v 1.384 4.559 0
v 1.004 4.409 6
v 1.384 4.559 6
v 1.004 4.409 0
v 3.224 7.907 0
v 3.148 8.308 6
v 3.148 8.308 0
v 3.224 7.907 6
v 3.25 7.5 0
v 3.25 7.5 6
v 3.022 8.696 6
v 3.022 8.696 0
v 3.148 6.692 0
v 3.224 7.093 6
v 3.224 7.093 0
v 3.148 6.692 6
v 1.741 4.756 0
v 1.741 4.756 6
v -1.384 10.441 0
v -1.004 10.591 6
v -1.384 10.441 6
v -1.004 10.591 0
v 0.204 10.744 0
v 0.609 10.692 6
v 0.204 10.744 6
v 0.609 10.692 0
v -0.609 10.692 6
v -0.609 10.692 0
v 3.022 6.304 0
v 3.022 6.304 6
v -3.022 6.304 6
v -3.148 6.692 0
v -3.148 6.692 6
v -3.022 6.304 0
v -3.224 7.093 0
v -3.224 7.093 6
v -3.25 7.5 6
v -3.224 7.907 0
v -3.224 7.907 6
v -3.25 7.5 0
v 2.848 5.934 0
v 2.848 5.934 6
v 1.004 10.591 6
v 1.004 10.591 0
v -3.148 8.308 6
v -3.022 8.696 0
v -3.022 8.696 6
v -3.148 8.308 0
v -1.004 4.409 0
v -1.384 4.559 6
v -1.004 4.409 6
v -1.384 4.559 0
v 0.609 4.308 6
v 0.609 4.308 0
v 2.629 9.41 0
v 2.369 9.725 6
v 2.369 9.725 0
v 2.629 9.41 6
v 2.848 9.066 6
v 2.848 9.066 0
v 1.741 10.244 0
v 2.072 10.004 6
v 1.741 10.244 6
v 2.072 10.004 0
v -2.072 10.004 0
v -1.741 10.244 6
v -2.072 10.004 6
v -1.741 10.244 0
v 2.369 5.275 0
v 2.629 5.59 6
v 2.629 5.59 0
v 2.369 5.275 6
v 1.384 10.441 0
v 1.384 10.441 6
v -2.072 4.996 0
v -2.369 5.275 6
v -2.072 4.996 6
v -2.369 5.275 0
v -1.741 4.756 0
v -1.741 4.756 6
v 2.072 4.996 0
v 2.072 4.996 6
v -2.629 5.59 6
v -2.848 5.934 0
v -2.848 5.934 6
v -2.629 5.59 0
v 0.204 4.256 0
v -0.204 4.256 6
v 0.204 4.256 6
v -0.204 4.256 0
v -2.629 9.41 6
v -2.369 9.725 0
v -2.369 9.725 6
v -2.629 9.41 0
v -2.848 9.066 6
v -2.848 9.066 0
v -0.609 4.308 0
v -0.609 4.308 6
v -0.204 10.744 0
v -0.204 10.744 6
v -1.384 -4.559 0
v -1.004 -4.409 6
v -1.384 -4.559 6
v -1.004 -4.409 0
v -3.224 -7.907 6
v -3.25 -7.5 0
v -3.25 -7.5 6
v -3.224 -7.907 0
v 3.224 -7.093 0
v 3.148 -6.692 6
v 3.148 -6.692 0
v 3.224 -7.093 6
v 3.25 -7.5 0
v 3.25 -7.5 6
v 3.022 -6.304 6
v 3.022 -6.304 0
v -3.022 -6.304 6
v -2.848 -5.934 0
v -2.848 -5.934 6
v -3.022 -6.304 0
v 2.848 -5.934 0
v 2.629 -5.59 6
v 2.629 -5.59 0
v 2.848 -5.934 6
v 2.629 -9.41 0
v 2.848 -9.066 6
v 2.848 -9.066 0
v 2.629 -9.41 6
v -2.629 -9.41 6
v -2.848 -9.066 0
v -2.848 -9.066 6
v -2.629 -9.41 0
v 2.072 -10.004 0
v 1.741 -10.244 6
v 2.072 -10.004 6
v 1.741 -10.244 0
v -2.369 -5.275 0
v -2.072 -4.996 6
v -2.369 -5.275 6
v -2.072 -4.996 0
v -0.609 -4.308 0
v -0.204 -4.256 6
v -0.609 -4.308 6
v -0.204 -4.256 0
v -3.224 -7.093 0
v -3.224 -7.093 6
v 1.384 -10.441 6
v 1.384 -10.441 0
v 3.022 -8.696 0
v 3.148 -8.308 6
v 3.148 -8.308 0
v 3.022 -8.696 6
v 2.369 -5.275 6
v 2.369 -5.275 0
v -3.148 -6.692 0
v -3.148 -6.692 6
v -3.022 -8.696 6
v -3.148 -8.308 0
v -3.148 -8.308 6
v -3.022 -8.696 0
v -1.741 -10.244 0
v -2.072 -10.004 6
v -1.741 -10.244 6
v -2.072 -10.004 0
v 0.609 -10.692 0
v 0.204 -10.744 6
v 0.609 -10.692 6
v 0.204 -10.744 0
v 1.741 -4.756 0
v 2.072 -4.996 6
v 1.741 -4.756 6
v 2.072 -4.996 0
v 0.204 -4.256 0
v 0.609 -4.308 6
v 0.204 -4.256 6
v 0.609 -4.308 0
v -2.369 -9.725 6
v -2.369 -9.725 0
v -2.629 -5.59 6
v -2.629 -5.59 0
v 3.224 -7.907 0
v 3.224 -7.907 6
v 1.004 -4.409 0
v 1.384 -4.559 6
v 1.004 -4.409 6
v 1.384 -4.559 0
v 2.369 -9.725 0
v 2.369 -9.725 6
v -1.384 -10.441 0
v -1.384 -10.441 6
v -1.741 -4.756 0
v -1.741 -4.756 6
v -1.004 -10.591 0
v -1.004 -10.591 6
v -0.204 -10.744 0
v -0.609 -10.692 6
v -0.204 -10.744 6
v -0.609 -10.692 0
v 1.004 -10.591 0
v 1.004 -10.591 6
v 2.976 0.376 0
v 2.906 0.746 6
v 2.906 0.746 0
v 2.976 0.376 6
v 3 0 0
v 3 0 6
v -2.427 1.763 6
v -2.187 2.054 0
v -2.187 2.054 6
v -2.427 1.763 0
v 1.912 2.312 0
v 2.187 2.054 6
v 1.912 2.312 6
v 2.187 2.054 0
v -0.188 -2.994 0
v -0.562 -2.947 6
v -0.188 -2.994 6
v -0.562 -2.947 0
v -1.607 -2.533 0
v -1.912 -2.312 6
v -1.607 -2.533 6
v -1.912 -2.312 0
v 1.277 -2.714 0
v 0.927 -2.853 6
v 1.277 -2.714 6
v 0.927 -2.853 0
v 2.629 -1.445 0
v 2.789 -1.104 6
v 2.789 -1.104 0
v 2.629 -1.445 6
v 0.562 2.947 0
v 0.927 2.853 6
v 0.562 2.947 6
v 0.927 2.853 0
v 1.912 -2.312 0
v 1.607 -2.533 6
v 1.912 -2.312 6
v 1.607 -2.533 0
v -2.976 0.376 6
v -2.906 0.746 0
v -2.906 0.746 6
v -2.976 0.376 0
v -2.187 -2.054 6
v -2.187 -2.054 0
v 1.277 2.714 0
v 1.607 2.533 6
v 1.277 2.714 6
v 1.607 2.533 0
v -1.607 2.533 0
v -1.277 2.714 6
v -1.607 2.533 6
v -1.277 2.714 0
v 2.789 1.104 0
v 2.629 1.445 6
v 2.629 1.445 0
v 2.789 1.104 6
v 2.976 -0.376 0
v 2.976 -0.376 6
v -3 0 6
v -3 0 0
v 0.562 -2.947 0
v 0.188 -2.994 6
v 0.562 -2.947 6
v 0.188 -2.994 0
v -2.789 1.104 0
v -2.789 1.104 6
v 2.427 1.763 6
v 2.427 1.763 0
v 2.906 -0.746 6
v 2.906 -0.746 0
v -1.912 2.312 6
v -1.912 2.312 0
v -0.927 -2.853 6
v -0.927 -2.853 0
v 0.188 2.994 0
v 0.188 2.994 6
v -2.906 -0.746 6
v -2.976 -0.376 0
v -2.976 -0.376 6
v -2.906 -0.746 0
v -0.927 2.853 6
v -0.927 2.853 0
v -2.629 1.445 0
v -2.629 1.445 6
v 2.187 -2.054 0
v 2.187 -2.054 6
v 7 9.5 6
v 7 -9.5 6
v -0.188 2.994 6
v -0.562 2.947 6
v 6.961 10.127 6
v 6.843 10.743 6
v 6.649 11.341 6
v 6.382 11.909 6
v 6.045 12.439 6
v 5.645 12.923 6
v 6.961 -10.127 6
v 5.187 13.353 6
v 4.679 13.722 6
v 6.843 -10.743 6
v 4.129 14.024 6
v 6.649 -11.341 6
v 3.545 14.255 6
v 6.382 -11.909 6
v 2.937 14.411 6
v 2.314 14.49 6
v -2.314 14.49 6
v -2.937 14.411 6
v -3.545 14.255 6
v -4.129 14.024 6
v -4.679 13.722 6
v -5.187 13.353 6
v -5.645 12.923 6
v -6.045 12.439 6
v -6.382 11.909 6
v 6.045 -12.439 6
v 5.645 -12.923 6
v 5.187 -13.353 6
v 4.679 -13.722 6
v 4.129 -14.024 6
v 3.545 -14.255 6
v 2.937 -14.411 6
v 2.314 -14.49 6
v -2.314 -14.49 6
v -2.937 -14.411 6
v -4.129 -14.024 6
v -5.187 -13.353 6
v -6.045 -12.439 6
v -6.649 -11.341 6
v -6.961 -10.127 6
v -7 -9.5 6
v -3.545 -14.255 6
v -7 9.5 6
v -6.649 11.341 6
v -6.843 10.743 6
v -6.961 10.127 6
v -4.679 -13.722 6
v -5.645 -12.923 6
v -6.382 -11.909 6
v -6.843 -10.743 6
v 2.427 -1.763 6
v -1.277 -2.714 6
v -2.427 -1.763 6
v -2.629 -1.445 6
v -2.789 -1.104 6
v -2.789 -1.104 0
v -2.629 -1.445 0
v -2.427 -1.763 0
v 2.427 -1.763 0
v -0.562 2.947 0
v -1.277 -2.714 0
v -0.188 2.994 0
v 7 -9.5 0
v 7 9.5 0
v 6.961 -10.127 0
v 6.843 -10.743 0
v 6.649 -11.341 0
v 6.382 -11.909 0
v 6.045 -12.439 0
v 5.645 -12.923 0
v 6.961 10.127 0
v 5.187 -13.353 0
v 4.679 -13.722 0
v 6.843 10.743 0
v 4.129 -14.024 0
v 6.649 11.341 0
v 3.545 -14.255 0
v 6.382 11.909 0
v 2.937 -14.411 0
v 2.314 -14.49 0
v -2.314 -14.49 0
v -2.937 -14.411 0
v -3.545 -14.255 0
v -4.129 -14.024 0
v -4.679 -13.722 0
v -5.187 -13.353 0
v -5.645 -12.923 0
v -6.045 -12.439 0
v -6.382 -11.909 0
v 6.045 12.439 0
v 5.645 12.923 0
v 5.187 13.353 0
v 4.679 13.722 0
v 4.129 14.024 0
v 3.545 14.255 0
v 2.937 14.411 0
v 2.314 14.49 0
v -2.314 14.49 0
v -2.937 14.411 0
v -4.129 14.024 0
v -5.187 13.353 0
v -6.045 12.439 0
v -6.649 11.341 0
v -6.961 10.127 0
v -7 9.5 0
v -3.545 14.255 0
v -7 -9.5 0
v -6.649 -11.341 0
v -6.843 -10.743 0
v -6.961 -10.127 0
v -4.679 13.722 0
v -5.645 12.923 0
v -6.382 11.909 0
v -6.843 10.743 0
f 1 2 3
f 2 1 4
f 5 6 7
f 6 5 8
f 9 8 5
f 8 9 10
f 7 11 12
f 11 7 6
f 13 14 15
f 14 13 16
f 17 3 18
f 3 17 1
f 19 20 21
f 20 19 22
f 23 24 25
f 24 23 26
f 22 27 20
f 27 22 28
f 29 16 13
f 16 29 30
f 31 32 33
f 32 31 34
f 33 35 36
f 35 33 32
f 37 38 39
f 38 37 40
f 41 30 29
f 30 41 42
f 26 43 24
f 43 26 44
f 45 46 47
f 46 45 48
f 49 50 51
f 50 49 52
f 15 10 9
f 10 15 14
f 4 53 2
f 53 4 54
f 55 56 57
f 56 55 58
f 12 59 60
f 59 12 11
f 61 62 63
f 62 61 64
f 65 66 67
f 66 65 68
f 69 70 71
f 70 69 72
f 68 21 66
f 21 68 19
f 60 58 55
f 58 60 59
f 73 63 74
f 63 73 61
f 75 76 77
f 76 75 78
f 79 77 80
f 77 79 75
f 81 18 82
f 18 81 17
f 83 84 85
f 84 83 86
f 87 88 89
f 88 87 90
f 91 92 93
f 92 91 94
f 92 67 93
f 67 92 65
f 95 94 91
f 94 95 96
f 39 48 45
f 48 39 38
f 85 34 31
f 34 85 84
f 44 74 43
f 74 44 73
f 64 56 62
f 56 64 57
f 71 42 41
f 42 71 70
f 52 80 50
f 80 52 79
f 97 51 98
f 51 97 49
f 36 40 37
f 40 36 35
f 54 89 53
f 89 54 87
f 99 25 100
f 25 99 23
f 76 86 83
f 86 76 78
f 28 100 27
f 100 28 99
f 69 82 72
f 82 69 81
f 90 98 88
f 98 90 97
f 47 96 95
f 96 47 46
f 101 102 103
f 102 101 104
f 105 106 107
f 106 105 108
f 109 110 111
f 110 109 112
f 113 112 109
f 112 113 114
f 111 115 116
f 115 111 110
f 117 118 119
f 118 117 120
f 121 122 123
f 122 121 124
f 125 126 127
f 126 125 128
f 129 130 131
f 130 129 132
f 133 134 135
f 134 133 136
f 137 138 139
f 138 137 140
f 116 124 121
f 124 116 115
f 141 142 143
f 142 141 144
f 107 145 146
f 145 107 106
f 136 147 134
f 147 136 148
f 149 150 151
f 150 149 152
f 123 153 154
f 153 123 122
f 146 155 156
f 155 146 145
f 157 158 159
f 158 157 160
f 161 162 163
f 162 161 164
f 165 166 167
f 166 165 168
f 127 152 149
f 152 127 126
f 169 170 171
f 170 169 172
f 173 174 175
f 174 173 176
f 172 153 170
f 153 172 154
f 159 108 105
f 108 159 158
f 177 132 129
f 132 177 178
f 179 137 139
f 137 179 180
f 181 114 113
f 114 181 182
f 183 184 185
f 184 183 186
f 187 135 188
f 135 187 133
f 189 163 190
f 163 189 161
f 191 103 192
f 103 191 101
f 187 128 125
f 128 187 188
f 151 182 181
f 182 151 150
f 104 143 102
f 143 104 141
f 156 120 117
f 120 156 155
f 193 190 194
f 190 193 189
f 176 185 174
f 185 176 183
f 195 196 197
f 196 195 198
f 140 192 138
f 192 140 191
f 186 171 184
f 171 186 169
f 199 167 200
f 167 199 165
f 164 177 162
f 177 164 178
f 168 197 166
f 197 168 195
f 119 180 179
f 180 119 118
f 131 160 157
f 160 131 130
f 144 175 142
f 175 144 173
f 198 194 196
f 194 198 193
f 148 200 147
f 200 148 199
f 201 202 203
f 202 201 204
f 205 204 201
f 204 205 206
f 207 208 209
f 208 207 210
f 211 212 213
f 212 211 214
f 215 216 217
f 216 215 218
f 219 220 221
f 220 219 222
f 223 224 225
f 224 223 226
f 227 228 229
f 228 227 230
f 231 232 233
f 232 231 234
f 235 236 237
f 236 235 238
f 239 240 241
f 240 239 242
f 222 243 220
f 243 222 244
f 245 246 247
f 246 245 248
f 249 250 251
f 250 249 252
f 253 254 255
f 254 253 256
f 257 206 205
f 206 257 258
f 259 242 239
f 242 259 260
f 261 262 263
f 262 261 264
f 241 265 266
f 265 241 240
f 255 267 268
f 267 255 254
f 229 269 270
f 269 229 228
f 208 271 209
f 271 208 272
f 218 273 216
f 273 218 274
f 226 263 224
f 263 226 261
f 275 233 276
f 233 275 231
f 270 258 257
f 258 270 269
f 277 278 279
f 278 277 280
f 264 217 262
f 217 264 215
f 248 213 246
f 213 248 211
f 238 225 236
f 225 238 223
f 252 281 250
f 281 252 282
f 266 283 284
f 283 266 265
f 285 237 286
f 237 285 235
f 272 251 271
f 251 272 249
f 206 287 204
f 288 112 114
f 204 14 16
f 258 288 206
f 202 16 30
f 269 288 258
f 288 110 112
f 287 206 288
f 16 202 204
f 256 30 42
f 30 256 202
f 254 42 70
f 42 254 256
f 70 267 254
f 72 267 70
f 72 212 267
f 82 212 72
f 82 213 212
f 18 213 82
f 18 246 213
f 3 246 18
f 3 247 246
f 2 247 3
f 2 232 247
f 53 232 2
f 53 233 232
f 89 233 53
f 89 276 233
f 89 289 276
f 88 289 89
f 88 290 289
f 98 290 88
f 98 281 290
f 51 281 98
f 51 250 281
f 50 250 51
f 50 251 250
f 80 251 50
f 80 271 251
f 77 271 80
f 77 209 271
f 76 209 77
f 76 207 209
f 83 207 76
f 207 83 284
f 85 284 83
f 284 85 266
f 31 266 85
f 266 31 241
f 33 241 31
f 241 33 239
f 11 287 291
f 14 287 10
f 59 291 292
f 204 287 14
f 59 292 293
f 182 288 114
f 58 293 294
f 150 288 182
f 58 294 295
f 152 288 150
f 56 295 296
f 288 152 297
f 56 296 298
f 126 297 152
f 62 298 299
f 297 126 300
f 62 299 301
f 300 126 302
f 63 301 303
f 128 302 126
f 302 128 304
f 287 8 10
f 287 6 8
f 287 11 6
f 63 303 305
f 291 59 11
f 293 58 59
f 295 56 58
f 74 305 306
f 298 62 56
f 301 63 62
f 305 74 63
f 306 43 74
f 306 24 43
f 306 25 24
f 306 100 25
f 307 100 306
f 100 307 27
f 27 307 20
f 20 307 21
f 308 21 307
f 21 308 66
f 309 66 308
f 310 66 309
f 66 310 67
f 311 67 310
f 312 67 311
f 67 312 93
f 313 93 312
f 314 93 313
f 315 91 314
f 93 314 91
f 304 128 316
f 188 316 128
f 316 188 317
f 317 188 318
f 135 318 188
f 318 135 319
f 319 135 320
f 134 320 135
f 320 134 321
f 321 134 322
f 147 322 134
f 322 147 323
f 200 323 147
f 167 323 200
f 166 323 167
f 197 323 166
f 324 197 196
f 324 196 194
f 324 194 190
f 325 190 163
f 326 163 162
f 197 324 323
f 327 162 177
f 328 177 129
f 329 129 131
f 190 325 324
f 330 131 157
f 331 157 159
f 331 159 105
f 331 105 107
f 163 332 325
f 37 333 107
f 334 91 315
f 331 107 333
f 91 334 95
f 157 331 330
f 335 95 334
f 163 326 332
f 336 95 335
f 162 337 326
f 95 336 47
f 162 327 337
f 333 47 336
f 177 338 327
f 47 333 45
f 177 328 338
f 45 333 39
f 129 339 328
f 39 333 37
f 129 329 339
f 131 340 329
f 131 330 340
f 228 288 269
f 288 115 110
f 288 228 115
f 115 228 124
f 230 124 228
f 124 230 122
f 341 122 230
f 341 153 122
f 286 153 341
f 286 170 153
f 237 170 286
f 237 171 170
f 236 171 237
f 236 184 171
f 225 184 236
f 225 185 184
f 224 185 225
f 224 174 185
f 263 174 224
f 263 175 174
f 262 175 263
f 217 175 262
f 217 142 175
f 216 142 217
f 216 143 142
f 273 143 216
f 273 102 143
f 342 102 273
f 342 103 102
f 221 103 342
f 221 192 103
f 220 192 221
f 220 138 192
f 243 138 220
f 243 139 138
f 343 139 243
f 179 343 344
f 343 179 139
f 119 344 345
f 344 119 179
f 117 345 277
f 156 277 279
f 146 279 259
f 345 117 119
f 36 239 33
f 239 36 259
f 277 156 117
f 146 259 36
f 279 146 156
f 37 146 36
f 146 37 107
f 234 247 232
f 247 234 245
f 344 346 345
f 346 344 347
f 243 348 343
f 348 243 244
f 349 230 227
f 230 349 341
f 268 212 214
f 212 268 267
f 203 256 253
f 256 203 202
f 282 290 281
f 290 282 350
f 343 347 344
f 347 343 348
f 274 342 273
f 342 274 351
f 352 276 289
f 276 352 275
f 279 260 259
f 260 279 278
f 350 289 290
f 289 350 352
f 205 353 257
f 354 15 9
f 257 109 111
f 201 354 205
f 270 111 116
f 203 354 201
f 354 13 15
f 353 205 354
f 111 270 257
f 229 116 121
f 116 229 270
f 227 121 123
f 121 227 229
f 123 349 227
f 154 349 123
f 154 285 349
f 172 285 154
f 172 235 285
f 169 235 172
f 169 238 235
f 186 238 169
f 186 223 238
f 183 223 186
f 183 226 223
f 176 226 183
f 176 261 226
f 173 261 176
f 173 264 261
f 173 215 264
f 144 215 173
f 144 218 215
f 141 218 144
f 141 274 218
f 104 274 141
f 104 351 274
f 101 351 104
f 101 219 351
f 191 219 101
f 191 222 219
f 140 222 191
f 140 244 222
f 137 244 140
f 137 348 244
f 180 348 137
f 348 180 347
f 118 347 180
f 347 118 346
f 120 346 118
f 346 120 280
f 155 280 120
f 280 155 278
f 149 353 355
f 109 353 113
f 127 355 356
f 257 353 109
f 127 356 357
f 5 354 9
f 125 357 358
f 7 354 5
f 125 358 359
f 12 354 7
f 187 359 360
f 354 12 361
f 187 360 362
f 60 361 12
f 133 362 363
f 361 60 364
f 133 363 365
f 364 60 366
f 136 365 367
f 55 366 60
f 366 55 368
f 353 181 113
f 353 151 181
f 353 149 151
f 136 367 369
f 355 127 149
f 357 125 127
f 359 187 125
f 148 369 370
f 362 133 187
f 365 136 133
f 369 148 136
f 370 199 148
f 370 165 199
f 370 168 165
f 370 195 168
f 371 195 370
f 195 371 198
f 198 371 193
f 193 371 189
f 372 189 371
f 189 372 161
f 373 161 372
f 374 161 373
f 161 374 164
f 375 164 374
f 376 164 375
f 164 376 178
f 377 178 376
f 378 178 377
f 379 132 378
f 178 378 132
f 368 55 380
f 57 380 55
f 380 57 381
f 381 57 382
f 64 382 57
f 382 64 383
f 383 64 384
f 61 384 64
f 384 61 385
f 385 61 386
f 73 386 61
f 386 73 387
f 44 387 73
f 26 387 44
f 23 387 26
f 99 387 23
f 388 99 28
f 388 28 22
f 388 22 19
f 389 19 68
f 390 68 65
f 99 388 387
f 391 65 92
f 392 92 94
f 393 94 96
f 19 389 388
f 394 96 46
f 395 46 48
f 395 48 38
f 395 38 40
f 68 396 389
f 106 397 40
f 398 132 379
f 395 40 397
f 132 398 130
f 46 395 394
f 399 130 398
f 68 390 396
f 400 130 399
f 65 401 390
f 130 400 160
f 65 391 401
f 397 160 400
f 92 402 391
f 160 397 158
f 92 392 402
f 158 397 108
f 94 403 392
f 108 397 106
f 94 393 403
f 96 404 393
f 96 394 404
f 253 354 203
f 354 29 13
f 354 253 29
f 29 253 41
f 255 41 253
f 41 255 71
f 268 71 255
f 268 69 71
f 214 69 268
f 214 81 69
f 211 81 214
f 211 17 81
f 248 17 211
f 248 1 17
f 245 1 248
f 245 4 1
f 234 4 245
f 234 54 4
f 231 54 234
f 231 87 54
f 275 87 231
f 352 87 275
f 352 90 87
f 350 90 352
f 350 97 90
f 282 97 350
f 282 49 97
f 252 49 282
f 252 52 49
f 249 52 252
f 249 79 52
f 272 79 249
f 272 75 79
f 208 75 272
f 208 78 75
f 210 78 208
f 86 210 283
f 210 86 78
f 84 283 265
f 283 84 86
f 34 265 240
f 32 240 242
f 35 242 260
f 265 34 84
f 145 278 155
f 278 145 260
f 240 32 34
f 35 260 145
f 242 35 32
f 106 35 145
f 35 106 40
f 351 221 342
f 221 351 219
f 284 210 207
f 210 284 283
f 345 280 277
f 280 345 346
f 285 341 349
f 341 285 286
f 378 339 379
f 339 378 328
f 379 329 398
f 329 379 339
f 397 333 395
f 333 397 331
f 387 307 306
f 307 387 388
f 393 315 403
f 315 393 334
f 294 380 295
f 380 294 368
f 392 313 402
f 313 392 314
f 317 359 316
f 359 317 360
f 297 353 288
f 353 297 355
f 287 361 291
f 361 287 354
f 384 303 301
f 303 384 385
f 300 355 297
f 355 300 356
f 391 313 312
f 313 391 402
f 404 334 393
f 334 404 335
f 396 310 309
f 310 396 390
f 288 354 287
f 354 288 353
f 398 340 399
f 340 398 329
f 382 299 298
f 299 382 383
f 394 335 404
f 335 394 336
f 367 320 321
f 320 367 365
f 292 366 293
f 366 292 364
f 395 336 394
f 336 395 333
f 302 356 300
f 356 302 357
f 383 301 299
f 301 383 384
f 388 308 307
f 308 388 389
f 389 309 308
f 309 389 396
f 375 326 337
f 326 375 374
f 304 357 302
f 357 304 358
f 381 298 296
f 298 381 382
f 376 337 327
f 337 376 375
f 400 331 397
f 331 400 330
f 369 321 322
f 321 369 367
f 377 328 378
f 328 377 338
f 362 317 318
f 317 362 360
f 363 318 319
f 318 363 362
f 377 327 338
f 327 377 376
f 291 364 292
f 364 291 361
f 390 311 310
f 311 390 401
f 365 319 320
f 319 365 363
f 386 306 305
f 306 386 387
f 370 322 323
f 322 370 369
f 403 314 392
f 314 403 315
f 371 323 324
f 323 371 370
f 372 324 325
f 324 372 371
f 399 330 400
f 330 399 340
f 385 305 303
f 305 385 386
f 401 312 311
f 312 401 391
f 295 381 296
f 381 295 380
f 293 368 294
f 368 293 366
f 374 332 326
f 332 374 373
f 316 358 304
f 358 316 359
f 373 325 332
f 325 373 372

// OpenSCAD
$fn = 50;


difference() {
	union() {
		hull() {
			translate(v = [-2.0000000000, 9.5000000000, 0]) {
				cylinder(h = 6, r = 5);
			}
			translate(v = [2.0000000000, 9.5000000000, 0]) {
				cylinder(h = 6, r = 5);
			}
			translate(v = [-2.0000000000, -9.5000000000, 0]) {
				cylinder(h = 6, r = 5);
			}
			translate(v = [2.0000000000, -9.5000000000, 0]) {
				cylinder(h = 6, r = 5);
			}
		}
	}
	union() {
		#translate(v = [0.0000000000, 7.5000000000, 0]) {
			cylinder(h = 6, r = 3.2500000000);
		}
		#translate(v = [0.0000000000, -7.5000000000, 0]) {
			cylinder(h = 6, r = 3.2500000000);
		}
		#translate(v = [0.0000000000, -7.5000000000, -100.0000000000]) {
			cylinder(h = 200, r = 3.2500000000);
		}
		#translate(v = [0.0000000000, -7.5000000000, -100.0000000000]) {
			cylinder(h = 200, r = 3.2500000000);
		}
		#translate(v = [0.0000000000, 7.5000000000, -100.0000000000]) {
			cylinder(h = 200, r = 3.2500000000);
		}
		#translate(v = [0.0000000000, 7.5000000000, -100.0000000000]) {
			cylinder(h = 200, r = 3.2500000000);
		}
		#translate(v = [0.0000000000, 7.5000000000, 0]) {
			cylinder(h = 6, r = 1.8000000000);
		}
		#translate(v = [0.0000000000, -7.5000000000, 0]) {
			cylinder(h = 6, r = 1.8000000000);
		}
		#translate(v = [0.0000000000, 7.5000000000, 0]) {
			cylinder(h = 6, r = 1.8000000000);
		}
		#translate(v = [0.0000000000, -7.5000000000, 0]) {
			cylinder(h = 6, r = 1.8000000000);
		}
		#translate(v = [0.0000000000, 7.5000000000, 0]) {
			cylinder(h = 6, r = 1.8000000000);
		}
		#translate(v = [0.0000000000, -7.5000000000, 0]) {
			cylinder(h = 6, r = 1.8000000000);
		}
		#cylinder(h = 6, r = 3.0000000000);
	}
}
